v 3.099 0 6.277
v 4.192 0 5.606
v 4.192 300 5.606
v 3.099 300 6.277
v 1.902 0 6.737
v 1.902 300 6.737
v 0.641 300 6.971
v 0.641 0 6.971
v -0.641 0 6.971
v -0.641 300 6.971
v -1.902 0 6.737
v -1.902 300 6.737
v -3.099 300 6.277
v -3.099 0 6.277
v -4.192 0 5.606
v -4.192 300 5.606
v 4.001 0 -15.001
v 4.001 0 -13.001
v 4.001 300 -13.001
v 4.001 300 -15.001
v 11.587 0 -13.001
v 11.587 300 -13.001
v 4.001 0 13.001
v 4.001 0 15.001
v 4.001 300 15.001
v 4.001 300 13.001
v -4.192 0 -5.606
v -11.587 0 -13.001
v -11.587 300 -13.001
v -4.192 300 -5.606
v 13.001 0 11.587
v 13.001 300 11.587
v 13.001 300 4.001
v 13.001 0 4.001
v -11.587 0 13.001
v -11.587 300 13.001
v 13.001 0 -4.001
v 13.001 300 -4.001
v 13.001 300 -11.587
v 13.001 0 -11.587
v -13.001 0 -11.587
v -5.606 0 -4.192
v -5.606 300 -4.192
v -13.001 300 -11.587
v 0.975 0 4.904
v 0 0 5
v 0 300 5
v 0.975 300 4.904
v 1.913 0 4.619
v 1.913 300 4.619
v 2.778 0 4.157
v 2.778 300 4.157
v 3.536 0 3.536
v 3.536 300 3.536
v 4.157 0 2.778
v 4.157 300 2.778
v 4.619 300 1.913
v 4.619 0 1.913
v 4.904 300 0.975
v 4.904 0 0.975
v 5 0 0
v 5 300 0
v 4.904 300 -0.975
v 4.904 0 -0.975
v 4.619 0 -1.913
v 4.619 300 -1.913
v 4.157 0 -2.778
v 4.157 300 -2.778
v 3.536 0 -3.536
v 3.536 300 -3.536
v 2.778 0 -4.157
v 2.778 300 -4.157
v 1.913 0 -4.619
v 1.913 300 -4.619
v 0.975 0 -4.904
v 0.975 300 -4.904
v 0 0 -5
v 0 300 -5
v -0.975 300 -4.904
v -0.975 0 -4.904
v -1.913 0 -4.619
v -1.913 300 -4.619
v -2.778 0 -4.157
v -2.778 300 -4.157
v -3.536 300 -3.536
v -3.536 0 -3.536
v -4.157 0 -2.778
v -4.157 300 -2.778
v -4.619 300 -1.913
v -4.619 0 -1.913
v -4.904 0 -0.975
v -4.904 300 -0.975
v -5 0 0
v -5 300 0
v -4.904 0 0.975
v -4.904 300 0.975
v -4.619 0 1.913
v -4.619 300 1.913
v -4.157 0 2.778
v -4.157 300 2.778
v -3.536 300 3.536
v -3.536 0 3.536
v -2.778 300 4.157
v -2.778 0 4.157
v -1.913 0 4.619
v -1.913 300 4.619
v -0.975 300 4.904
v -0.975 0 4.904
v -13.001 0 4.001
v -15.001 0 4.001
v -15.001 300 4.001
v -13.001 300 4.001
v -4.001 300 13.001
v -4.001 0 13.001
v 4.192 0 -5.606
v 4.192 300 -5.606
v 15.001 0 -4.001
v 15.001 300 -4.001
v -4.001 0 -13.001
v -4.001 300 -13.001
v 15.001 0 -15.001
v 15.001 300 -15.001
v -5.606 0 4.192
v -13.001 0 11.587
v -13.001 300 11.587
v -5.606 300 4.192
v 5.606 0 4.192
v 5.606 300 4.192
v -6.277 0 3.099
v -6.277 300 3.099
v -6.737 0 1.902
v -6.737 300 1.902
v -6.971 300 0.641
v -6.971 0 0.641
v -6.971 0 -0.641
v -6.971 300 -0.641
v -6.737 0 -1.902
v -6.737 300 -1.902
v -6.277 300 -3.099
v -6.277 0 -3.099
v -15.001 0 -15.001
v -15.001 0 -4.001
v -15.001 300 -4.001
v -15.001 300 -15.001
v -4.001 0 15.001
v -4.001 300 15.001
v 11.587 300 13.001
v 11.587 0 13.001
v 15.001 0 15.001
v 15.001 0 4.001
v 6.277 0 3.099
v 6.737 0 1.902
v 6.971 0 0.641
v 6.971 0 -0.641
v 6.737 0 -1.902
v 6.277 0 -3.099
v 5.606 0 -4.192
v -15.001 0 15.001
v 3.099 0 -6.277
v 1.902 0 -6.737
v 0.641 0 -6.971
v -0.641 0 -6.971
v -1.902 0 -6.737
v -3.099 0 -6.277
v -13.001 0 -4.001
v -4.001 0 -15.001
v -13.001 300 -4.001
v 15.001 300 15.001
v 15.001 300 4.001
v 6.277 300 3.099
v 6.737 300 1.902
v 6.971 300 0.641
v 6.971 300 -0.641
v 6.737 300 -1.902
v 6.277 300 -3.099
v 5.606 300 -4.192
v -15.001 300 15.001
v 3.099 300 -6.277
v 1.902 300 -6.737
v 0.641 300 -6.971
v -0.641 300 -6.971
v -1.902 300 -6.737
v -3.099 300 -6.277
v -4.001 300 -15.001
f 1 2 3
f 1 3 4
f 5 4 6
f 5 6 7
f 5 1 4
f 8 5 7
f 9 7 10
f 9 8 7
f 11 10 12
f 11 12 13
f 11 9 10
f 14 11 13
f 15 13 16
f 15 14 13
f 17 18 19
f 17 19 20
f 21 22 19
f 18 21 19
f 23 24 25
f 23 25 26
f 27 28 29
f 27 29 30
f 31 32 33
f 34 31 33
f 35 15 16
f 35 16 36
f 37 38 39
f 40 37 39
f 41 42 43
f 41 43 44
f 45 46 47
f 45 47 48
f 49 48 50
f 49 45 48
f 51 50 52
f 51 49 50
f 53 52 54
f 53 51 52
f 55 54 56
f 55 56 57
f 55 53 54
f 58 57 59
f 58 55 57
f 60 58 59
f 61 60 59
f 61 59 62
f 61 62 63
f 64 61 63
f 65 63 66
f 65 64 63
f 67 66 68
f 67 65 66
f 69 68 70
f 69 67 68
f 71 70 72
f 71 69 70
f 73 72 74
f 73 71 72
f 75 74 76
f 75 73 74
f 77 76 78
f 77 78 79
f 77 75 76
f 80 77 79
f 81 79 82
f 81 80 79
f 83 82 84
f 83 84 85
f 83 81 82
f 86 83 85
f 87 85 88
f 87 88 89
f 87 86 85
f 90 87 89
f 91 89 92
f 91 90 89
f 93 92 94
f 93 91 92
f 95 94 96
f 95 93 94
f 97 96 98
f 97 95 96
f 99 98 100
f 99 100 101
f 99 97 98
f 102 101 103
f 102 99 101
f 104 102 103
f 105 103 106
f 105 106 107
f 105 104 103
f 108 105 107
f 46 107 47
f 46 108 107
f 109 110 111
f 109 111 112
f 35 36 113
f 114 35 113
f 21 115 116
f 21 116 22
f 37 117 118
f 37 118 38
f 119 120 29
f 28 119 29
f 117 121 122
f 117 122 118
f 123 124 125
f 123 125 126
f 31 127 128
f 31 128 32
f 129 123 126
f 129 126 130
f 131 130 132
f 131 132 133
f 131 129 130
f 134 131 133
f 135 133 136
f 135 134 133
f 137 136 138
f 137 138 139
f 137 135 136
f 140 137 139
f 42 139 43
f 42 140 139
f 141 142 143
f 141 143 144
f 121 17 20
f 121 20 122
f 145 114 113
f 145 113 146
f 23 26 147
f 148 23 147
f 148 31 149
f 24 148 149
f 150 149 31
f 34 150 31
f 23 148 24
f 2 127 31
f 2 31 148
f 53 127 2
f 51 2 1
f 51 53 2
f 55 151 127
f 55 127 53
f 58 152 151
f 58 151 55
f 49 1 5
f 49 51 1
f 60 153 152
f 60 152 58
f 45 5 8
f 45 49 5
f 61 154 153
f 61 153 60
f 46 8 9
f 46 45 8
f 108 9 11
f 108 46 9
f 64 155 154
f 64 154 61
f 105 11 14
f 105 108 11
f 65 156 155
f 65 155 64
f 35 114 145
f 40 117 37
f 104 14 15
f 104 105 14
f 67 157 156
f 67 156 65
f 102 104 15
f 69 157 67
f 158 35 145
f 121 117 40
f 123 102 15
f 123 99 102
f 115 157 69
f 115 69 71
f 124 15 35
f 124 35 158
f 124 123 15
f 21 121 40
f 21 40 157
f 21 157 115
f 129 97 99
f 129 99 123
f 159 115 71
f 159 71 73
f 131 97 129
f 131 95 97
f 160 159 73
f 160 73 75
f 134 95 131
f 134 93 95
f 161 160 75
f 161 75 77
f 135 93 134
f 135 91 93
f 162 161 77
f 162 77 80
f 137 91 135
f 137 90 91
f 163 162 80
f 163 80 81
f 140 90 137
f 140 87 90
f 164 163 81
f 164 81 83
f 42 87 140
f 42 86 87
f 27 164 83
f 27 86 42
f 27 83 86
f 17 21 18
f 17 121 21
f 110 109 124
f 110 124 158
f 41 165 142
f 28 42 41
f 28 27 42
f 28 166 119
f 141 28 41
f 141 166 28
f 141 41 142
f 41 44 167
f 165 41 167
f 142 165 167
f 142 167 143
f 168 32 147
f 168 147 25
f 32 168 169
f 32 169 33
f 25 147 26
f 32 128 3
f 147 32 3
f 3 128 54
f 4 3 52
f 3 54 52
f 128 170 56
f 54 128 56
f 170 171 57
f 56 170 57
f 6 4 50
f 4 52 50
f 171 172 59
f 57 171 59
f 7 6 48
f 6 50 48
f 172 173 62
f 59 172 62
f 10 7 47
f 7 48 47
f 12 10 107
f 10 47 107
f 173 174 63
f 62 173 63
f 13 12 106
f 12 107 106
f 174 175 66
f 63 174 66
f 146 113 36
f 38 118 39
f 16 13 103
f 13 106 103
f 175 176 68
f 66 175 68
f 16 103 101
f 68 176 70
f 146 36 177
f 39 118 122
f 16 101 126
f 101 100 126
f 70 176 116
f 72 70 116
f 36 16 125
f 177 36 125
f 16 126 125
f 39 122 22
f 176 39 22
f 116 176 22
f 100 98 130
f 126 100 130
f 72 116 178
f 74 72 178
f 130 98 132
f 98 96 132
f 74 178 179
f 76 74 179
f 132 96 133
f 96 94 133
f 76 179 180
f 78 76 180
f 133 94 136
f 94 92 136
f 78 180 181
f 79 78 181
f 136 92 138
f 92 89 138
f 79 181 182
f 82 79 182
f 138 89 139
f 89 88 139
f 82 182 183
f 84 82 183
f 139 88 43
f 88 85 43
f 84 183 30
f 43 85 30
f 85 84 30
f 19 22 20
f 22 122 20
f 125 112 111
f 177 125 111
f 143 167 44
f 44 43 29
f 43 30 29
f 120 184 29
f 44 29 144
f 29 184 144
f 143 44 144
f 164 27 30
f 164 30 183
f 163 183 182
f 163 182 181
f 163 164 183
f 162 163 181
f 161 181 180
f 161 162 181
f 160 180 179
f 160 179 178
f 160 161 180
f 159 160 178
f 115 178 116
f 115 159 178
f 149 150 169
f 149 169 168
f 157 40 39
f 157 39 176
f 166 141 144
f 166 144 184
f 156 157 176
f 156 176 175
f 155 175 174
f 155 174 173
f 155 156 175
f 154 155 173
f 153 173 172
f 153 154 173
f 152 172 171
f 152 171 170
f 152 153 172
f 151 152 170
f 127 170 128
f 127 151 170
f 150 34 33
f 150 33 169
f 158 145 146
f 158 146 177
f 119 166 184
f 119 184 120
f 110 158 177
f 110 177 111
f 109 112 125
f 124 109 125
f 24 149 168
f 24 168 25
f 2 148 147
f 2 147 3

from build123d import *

# Parameters (mm, degrees)
SKETCH1_R           = 5
BOSS_EXTRUDE1_DEPTH = 300


with BuildPart() as part:
    # Sketch1 → Boss-Extrude1 (new body)
    with BuildSketch(Plane(origin=(0, 0, 0), x_dir=(1, 0, 0), z_dir=(0, 1, 0))):
        with BuildLine():
            Line((4.191872704, 5.606086267), (11.5870568, 13.001270363))
            Line((11.5870568, 13.001270363), (4.001270363, 13.001270363))
            Line((4.001270363, 13.001270363), (4.001270363, 15.001270363))
            Line((4.001270363, 15.001270363), (15.001270363, 15.001270363))
            Line((15.001270363, 15.001270363), (15.001270363, 4.001270363))
            Line((15.001270363, 4.001270363), (13.001270363, 4.001270363))
            Line((13.001270363, 4.001270363), (13.001270363, 11.5870568))
            Line((13.001270363, 11.5870568), (5.606086267, 4.191872704))
            ThreePointArc((5.606086267, 4.191872704), (7, 0), (5.606086267, -4.191872704))
            Line((5.606086267, -4.191872704), (13.001270363, -11.5870568))
            Line((13.001270363, -11.5870568), (13.001270363, -4.001270363))
            Line((13.001270363, -4.001270363), (15.001270363, -4.001270363))
            Line((15.001270363, -4.001270363), (15.001270363, -15.001270363))
            Line((15.001270363, -15.001270363), (4.001270363, -15.001270363))
            Line((4.001270363, -15.001270363), (4.001270363, -13.001270363))
            Line((4.001270363, -13.001270363), (11.5870568, -13.001270363))
            Line((11.5870568, -13.001270363), (4.191872704, -5.606086267))
            ThreePointArc((4.191872704, -5.606086267), (0, -7), (-4.191872704, -5.606086267))
            Line((-4.191872704, -5.606086267), (-11.5870568, -13.001270363))
            Line((-11.5870568, -13.001270363), (-4.001270363, -13.001270363))
            Line((-4.001270363, -13.001270363), (-4.001270363, -15.001270363))
            Line((-4.001270363, -15.001270363), (-15.001270363, -15.001270363))
            Line((-15.001270363, -15.001270363), (-15.001270363, -4.001270363))
            Line((-15.001270363, -4.001270363), (-13.001270363, -4.001270363))
            Line((-13.001270363, -4.001270363), (-13.001270363, -11.5870568))
            Line((-13.001270363, -11.5870568), (-5.606086267, -4.191872704))
            ThreePointArc((-5.606086267, -4.191872704), (-7, 0), (-5.606086267, 4.191872704))
            Line((-5.606086267, 4.191872704), (-13.001270363, 11.5870568))
            Line((-13.001270363, 11.5870568), (-13.001270363, 4.001270363))
            Line((-13.001270363, 4.001270363), (-15.001270363, 4.001270363))
            Line((-15.001270363, 4.001270363), (-15.001270363, 15.001270363))
            Line((-15.001270363, 15.001270363), (-4.001270363, 15.001270363))
            Line((-4.001270363, 15.001270363), (-4.001270363, 13.001270363))
            Line((-4.001270363, 13.001270363), (-11.5870568, 13.001270363))
            Line((-11.5870568, 13.001270363), (-4.191872704, 5.606086267))
            ThreePointArc((-4.191872704, 5.606086267), (0, 7), (4.191872704, 5.606086267))
        make_face()
        with Locations(Location((0, 0, 0), (0, 0, 270))):
            Circle(SKETCH1_R, mode=Mode.SUBTRACT)
    extrude(amount=BOSS_EXTRUDE1_DEPTH)


solid = part.part
